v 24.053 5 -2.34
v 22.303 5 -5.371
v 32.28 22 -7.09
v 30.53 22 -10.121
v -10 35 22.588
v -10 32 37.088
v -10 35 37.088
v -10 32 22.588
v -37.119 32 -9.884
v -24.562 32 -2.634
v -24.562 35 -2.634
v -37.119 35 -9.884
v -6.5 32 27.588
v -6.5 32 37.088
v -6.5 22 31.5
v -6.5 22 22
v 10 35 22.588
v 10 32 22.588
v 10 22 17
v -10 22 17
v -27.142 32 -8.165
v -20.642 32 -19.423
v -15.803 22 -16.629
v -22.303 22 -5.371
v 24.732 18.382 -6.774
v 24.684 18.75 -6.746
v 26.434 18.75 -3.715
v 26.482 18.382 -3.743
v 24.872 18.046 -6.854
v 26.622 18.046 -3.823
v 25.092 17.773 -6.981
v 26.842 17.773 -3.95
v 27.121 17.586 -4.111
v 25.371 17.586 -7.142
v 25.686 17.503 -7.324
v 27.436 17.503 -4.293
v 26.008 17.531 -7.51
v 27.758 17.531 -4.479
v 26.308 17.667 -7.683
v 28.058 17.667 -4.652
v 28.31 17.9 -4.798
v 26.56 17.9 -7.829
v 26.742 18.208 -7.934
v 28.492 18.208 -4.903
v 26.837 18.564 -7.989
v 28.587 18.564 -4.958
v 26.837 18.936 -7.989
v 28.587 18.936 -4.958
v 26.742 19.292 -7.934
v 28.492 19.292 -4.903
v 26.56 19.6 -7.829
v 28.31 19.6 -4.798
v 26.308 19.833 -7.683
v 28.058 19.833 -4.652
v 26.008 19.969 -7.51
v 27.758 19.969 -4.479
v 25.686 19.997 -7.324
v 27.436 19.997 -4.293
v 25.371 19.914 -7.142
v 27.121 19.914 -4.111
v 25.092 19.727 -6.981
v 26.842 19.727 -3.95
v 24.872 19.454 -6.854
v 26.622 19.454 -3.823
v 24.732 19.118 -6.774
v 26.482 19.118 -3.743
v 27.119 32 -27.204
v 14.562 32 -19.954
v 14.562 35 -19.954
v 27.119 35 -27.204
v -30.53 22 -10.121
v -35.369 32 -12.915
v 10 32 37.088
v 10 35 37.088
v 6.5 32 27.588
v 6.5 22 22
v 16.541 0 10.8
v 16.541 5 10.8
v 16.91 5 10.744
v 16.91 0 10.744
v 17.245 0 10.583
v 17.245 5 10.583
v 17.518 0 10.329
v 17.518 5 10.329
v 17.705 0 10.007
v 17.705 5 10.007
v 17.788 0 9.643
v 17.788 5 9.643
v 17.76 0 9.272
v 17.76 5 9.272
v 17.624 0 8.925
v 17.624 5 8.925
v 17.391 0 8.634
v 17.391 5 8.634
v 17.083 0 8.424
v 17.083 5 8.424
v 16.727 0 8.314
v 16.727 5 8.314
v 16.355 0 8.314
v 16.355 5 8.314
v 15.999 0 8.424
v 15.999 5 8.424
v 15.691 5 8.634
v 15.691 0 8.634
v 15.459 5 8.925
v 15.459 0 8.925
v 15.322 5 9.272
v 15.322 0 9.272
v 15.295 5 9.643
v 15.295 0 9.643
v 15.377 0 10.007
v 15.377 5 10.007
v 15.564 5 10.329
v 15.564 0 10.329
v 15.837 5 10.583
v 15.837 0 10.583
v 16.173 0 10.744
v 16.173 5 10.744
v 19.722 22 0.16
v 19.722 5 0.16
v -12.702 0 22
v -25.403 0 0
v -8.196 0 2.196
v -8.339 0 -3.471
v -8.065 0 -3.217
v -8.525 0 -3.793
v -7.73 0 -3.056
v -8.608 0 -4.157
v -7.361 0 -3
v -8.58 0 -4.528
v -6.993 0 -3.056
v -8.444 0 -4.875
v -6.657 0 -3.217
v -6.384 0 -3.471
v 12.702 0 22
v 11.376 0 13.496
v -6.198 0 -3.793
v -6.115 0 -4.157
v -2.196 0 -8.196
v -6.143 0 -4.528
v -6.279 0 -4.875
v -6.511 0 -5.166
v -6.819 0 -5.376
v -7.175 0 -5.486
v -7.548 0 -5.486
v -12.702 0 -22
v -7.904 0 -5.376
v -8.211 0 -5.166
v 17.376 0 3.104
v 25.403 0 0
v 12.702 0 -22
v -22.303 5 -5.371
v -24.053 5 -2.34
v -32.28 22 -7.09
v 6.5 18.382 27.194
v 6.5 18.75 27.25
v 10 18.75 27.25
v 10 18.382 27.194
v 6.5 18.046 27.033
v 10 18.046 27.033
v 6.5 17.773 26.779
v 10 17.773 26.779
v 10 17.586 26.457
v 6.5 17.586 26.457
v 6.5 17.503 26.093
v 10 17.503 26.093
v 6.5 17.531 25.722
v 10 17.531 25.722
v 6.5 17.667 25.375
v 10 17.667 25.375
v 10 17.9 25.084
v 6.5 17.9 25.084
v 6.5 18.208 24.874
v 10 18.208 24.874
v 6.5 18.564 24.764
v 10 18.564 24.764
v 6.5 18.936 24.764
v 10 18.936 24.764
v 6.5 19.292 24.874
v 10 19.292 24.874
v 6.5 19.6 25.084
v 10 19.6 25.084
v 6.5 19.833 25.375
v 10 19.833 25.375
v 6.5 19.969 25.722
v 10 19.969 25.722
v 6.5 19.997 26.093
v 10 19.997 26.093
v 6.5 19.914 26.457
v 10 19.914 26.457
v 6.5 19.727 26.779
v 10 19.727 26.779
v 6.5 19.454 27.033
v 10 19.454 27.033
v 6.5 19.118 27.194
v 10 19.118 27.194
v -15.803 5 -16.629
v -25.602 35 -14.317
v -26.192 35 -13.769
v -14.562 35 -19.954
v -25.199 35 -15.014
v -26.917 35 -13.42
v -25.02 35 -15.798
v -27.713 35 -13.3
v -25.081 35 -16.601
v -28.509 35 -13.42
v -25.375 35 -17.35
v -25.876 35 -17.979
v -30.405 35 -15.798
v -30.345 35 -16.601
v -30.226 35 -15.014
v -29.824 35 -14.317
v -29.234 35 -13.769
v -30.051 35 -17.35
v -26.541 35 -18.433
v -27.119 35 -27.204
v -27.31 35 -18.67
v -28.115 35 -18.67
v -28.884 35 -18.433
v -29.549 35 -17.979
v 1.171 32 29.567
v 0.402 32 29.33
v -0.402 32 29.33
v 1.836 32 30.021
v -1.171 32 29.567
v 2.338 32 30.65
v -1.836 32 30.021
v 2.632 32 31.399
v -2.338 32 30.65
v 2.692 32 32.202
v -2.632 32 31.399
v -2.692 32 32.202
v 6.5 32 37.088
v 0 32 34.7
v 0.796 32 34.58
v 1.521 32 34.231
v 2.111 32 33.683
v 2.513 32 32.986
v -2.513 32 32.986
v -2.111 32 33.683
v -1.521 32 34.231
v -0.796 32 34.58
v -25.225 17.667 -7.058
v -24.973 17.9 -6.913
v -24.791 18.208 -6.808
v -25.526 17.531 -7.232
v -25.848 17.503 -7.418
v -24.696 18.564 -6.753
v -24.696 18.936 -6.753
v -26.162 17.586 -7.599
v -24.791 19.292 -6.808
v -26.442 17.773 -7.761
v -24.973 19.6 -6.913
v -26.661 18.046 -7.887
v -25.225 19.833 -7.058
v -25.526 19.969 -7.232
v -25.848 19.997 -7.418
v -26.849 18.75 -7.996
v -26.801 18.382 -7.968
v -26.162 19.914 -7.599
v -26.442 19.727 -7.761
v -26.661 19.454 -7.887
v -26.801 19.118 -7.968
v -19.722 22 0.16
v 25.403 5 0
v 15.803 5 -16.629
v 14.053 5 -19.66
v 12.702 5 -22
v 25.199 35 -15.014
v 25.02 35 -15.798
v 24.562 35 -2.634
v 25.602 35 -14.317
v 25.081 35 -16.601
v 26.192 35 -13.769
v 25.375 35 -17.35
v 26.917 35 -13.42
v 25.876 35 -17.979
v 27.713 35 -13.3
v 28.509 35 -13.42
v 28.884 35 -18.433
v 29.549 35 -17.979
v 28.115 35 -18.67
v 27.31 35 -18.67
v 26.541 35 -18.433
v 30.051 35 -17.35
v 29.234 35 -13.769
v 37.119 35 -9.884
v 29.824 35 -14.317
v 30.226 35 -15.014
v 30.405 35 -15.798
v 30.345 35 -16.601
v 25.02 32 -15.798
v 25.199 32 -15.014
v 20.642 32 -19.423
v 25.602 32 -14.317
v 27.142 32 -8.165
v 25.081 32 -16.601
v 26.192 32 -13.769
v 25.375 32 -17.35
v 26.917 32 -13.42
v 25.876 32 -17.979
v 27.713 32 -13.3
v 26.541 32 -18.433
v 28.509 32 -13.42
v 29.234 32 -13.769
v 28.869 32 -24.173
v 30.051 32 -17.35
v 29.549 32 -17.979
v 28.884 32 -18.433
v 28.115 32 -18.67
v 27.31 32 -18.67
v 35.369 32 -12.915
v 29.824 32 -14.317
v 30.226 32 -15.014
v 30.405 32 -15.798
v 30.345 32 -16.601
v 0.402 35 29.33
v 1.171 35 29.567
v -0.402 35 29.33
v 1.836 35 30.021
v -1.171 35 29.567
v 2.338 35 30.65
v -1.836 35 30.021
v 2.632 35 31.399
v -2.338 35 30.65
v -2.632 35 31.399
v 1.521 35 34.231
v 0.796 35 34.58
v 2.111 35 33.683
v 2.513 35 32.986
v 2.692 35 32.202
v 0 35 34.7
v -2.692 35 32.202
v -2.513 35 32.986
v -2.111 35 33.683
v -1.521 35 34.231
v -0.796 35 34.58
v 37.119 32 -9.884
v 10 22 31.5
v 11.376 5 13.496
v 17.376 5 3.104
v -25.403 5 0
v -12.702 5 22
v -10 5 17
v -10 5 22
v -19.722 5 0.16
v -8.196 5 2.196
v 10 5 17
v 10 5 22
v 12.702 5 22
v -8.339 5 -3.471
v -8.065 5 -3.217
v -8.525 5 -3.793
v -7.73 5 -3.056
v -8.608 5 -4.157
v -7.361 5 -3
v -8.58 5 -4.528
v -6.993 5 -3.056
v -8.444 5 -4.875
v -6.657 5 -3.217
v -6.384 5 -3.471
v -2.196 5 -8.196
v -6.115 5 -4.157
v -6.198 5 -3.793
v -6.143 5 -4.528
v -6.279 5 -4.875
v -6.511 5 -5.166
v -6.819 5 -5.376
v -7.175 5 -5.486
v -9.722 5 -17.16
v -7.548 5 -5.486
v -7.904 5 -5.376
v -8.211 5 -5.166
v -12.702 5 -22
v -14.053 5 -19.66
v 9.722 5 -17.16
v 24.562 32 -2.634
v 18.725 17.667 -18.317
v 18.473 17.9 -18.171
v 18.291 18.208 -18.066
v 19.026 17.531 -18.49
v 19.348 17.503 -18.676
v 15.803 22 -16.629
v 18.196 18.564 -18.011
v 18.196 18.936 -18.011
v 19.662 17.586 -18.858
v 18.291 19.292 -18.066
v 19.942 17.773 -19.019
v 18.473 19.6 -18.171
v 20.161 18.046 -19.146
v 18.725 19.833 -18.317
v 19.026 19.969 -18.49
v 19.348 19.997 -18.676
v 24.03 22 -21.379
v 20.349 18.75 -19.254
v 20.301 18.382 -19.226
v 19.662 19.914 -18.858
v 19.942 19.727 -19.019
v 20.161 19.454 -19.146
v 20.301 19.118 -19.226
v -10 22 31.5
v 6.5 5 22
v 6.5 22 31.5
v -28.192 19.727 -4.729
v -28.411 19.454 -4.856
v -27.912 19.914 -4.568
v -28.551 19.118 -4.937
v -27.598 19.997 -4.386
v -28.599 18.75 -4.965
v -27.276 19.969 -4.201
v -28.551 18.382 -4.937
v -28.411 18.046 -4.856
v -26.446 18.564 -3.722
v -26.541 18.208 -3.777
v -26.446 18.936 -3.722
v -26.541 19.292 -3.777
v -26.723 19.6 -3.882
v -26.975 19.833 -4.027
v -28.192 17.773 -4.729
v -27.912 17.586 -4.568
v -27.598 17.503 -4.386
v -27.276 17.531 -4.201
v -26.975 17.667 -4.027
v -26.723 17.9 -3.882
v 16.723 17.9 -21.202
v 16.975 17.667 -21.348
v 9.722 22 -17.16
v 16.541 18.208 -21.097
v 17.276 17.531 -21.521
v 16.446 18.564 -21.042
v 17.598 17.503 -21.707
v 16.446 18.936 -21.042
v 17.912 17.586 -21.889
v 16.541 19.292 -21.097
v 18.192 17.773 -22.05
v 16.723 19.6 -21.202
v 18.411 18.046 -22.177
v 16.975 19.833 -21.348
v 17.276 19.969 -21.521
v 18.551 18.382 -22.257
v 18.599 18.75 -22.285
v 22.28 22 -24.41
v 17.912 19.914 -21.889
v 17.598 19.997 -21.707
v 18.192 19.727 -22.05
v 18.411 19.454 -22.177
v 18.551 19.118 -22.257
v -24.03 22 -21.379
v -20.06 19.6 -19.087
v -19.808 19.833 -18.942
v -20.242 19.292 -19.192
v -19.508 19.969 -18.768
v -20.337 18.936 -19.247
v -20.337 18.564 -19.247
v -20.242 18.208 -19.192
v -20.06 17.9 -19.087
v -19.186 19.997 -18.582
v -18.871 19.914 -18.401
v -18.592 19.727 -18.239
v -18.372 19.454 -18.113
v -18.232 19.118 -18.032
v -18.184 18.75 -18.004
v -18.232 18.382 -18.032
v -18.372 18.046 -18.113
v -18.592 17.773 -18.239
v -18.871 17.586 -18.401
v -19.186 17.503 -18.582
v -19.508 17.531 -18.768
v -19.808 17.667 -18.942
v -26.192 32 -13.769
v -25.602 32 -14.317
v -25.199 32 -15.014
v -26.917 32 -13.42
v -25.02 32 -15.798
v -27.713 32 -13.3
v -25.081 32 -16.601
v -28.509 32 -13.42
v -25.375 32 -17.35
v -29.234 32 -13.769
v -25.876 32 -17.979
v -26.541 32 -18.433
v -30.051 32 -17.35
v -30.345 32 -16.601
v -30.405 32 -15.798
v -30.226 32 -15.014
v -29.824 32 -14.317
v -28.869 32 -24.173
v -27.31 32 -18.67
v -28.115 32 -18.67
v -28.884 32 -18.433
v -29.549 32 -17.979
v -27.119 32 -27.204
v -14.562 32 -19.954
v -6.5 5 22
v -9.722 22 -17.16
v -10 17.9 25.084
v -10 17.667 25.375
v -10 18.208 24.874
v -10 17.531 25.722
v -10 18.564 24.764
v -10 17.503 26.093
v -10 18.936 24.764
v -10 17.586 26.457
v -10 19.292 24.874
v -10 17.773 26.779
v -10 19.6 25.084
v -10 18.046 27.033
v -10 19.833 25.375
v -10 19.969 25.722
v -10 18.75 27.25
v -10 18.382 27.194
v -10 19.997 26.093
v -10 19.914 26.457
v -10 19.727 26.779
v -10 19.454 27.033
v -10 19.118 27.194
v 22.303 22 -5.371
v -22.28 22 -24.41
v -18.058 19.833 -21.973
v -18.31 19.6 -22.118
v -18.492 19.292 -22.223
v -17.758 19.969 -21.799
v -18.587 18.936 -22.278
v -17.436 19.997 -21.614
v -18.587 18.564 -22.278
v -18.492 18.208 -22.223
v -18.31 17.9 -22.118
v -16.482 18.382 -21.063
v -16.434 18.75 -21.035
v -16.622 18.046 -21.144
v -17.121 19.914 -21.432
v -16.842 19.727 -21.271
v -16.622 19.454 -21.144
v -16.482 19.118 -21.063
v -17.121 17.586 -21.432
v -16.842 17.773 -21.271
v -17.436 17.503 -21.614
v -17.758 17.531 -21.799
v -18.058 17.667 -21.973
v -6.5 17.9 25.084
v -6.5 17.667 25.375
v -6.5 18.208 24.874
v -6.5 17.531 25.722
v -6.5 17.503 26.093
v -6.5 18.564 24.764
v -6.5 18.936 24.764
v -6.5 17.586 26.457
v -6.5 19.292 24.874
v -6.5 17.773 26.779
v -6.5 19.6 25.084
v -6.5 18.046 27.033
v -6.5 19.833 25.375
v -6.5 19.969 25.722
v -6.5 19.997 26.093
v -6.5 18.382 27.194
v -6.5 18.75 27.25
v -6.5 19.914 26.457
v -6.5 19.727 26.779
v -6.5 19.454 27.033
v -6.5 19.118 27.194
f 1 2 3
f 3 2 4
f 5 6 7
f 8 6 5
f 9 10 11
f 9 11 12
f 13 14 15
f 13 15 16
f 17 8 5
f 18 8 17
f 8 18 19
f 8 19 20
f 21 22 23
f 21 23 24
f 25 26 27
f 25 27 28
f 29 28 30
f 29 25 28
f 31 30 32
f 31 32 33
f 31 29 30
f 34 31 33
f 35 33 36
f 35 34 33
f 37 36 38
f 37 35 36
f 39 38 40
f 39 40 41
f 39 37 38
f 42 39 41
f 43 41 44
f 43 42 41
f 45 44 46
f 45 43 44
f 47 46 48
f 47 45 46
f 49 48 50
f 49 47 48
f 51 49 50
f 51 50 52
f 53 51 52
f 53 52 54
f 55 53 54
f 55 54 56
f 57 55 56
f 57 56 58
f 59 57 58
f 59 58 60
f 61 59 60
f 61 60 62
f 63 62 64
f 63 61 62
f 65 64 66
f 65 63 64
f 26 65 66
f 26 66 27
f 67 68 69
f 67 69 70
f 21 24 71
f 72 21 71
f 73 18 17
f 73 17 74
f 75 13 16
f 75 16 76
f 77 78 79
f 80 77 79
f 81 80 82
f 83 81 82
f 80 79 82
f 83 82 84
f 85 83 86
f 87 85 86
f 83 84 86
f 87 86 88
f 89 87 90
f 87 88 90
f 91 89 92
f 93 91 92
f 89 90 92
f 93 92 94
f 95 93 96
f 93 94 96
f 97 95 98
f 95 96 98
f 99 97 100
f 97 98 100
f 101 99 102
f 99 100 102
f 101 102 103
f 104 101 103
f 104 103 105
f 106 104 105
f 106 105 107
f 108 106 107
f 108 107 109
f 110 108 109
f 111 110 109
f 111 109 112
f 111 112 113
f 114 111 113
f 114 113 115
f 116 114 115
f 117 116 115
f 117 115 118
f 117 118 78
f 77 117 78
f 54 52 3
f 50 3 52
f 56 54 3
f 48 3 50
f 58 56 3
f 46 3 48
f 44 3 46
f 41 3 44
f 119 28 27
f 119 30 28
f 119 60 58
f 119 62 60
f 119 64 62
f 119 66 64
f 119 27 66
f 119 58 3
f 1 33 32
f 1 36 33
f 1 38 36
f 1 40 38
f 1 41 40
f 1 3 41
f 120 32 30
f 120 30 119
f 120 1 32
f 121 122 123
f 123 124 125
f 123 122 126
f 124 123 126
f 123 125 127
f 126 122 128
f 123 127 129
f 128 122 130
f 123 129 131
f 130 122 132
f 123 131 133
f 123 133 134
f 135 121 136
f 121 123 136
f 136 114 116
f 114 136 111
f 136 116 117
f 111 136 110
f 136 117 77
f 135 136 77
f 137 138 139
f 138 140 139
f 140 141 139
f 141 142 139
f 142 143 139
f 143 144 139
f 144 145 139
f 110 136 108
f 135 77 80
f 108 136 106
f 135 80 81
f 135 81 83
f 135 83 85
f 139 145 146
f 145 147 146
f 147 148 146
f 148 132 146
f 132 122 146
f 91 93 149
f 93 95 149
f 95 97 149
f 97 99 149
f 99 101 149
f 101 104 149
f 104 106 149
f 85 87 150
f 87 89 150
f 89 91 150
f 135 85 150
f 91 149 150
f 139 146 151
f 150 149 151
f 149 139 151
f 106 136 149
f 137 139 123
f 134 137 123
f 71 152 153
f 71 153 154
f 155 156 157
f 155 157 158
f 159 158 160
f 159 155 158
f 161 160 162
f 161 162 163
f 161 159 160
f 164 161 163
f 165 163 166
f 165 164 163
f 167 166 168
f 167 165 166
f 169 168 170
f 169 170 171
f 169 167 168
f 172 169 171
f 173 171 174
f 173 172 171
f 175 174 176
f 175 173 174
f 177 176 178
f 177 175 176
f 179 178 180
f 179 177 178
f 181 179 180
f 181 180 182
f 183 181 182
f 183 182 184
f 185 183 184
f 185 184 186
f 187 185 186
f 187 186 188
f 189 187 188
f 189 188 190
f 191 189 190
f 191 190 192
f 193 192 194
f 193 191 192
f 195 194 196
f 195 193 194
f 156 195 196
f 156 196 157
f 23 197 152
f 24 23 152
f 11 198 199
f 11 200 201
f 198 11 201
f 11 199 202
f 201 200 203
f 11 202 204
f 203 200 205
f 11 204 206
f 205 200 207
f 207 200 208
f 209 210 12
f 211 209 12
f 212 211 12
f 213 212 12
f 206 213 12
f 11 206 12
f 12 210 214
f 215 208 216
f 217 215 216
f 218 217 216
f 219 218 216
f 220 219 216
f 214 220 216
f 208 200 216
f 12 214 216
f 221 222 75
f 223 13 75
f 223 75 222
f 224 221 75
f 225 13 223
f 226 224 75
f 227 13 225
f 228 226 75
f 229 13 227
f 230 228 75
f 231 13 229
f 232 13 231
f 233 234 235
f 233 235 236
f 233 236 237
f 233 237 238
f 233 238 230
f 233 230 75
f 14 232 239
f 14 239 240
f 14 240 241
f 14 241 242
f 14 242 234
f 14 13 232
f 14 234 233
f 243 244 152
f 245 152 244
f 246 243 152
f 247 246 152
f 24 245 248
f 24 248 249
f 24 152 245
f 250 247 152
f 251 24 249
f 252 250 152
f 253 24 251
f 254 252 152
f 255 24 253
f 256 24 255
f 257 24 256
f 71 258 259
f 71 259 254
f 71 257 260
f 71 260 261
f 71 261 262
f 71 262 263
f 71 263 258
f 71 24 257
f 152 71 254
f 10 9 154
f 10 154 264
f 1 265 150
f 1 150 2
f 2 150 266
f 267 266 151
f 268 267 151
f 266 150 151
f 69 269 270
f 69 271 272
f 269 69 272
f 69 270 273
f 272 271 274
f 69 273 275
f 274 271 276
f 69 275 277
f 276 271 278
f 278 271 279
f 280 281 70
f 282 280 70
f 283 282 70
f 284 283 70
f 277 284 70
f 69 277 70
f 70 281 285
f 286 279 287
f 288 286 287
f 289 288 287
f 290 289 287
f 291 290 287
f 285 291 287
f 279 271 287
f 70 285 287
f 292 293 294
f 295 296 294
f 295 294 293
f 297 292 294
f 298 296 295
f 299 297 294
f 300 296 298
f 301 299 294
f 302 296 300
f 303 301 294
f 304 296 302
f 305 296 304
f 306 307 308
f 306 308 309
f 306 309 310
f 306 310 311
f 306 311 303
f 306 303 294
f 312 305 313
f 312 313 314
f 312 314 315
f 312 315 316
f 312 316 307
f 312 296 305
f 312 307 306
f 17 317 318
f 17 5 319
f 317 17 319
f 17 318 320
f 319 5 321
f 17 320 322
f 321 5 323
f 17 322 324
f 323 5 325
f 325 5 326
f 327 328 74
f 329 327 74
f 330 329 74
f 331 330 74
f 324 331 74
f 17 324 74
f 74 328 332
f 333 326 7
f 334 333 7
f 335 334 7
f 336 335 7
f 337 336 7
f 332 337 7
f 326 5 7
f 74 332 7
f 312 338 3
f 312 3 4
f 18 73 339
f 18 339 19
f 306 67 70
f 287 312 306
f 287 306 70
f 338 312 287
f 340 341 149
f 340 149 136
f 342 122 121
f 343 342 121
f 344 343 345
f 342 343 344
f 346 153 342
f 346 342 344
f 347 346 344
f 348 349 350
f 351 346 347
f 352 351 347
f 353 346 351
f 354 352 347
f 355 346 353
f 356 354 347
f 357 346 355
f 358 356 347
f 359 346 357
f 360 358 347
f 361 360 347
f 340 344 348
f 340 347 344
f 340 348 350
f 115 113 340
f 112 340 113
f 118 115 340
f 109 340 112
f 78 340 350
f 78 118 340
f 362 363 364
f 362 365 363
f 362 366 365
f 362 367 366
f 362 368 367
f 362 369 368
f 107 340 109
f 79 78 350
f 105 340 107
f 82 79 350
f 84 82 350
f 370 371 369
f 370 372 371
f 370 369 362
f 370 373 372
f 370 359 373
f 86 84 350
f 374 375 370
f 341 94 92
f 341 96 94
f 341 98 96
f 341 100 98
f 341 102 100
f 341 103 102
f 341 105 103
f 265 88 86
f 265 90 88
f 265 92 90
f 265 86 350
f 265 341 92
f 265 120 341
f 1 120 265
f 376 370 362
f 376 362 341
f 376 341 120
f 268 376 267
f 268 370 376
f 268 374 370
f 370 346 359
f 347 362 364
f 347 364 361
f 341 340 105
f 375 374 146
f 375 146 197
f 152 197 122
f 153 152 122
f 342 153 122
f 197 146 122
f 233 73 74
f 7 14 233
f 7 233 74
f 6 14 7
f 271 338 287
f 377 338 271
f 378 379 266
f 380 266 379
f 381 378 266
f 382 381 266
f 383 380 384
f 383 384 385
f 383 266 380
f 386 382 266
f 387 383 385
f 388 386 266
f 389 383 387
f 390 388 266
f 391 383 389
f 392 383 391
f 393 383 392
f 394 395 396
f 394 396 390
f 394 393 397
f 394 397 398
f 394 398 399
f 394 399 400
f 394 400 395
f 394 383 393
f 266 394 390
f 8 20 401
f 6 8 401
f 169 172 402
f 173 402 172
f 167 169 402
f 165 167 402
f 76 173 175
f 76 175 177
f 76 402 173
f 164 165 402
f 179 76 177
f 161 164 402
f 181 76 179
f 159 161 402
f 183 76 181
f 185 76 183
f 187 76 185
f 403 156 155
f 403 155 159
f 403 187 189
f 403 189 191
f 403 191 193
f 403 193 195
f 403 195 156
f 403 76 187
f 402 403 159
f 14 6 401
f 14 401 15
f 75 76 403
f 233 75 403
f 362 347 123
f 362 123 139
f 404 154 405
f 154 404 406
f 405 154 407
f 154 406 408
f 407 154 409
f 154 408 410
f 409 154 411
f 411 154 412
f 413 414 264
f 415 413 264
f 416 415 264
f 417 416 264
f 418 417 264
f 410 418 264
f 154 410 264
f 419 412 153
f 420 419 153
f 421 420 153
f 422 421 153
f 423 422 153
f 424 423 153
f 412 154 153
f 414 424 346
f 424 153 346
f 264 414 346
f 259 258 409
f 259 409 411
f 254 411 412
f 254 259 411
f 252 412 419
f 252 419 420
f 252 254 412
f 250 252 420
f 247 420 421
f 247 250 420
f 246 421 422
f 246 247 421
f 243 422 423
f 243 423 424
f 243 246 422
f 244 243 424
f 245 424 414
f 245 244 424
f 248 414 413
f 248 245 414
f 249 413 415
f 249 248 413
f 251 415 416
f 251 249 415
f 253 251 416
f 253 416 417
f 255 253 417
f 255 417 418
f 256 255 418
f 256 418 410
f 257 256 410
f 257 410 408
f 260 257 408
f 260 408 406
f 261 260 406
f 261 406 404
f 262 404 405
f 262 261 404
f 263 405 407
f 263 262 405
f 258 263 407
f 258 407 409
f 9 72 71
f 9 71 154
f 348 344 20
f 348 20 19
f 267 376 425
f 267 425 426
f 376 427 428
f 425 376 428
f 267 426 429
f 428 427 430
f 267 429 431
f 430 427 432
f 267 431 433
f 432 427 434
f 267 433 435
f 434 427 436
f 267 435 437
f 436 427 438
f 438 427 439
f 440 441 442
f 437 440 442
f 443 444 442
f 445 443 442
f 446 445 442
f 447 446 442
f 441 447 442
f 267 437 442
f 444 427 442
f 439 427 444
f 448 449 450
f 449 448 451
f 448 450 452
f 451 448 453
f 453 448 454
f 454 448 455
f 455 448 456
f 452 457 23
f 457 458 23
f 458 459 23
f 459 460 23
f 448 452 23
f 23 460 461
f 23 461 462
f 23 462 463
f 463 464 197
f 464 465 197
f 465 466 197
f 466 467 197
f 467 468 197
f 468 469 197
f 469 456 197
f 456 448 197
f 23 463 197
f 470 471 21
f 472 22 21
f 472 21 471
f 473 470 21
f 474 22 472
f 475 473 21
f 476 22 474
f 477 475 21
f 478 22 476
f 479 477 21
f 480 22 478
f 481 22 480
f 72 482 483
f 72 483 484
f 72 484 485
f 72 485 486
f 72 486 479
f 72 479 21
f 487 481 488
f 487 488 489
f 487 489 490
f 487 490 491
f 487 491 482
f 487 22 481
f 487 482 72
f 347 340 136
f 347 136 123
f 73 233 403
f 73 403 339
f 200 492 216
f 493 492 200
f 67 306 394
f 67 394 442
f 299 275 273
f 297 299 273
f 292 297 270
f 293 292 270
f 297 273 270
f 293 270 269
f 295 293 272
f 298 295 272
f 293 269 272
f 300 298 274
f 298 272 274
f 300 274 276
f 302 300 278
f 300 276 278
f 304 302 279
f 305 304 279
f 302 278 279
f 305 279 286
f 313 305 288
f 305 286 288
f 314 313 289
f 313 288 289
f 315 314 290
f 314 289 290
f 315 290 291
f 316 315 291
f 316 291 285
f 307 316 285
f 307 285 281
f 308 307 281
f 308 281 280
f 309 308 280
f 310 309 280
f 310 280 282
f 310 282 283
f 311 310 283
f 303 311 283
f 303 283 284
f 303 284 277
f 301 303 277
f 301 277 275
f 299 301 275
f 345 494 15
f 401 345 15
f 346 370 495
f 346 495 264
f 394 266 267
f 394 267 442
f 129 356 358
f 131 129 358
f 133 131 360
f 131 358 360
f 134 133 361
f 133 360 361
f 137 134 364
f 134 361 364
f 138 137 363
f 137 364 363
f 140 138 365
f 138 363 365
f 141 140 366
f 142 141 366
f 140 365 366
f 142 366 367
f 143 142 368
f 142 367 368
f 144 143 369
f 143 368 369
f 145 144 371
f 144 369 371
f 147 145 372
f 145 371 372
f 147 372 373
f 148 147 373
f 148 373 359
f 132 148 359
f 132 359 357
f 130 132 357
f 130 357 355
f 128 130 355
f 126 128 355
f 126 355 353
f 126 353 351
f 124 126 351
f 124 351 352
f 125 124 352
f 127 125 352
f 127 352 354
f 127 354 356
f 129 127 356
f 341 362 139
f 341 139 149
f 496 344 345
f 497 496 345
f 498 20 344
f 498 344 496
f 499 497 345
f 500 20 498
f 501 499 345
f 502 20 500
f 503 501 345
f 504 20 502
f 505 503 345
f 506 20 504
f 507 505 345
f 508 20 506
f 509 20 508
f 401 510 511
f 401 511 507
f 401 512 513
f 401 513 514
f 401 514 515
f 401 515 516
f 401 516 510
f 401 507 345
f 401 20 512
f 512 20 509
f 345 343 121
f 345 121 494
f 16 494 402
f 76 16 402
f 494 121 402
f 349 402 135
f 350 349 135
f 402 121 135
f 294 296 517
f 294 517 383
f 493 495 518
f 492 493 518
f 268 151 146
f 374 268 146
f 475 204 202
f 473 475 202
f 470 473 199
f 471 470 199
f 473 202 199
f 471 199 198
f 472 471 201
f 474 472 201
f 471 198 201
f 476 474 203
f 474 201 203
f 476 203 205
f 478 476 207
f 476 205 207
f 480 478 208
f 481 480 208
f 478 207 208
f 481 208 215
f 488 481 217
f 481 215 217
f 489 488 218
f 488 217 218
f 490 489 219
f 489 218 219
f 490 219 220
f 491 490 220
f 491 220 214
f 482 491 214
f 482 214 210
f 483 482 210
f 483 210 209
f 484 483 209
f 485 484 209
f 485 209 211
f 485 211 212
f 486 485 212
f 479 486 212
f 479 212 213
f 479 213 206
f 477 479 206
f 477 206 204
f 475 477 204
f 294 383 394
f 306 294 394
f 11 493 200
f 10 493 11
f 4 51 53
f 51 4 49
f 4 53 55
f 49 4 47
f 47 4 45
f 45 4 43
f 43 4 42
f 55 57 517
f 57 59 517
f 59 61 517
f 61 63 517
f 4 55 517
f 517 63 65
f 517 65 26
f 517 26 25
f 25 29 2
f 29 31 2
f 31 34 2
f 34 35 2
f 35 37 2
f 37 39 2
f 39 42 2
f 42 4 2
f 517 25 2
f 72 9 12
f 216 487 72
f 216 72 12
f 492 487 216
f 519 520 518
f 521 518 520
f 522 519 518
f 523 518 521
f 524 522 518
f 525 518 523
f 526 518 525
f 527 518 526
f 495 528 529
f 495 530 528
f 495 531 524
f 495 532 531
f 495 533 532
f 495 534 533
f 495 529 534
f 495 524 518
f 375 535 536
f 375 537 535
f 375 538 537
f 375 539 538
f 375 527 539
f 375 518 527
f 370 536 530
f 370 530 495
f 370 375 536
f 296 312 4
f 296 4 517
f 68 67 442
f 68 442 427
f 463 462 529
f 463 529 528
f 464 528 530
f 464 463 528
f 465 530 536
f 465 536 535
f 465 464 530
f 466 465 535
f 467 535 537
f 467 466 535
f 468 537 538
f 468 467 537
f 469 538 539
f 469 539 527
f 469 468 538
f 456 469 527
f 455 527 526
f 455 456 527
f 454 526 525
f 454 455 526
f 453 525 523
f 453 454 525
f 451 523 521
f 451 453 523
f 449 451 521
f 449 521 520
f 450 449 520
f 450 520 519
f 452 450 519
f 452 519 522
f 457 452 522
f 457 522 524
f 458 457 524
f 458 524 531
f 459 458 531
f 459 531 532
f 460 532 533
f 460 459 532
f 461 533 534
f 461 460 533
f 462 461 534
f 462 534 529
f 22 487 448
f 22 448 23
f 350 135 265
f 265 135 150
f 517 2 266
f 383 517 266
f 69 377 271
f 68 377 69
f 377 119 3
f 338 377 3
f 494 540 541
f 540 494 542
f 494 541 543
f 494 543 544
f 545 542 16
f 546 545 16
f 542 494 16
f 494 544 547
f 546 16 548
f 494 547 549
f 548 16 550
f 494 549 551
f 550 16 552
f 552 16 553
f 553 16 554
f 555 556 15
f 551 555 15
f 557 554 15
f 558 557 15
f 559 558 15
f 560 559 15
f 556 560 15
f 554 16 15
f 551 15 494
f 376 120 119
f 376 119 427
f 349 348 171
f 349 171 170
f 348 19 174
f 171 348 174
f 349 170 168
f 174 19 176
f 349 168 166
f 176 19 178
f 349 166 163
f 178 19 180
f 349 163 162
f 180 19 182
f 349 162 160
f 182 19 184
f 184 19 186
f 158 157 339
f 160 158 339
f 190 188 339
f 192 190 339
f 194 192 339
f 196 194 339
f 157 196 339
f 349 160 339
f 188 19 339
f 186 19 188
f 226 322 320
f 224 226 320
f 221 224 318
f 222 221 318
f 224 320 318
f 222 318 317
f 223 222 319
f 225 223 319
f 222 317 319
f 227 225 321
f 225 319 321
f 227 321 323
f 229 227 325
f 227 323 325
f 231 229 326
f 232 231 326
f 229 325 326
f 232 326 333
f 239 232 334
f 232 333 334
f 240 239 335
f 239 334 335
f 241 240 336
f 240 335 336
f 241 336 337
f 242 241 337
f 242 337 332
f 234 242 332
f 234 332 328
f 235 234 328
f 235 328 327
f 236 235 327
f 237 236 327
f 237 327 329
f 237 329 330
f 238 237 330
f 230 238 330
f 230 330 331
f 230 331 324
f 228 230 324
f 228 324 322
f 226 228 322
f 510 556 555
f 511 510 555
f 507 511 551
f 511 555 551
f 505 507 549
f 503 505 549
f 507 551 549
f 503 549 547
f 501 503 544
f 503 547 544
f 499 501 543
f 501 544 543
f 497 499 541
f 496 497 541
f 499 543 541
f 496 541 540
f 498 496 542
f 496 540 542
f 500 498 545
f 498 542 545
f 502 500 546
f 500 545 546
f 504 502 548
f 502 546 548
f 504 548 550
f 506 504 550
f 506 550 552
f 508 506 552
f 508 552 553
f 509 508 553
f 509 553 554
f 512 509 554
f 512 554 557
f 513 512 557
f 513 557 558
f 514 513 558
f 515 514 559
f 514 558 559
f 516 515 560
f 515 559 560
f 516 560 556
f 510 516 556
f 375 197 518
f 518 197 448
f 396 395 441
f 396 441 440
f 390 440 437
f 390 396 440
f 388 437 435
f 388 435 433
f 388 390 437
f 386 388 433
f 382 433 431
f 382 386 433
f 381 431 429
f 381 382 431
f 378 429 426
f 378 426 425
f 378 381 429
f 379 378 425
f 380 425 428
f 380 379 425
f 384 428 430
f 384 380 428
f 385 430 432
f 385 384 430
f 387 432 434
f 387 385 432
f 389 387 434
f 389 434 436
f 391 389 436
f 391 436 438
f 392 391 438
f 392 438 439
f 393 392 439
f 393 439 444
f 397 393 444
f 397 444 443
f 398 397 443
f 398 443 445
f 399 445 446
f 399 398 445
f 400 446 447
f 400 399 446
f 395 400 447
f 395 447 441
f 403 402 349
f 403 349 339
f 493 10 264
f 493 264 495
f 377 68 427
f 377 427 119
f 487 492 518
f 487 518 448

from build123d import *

# Parameters (mm, degrees)
BOSS_EXTRUDE1_DEPTH         = 5
SKETCH4_W                   = 20
SKETCH4_H                   = 5
BOSS_EXTRUDE3_DEPTH         = 17
BOSS_EXTRUDE2_START         = 6.5
SKETCH2_R                   = 1.25
BOSS_EXTRUDE2_DEPTH         = 3.5
CIRPATTERN1_COUNT           = 3
CIRPATTERN1_COPY_1_SKETCH_W = 20
CIRPATTERN1_COPY_1_SKETCH_H = 5
CIRPATTERN1_COPY_1_DEPTH    = 17
CIRPATTERN1_COPY_2_SKETCH_W = 20
CIRPATTERN1_COPY_2_SKETCH_H = 5
CIRPATTERN1_COPY_2_DEPTH    = 17
CIRPATTERN1_START           = 6.5
CIRPATTERN1_COPY_3_SKETCH_R = 1.25
CIRPATTERN1_COPY_3_DEPTH    = 3.5
CIRPATTERN1_COPY_4_SKETCH_R = 1.25
CIRPATTERN1_COPY_4_DEPTH    = 3.5
CUT_EXTRUDE1_REACH          = 50.2
CUT_EXTRUDE2_REACH          = 50.2
SKETCH6_R                   = 1.25
BOSS_EXTRUDE4_DEPTH         = 3
CUT_EXTRUDE3_REACH          = 61.959
SKETCH13_R                  = 2.7
CIRPATTERN2_COUNT           = 3


with BuildPart() as part:
    # Sketch1 → Boss-Extrude1 (new body)
    with BuildSketch(Plane(origin=(0, 0, 0), x_dir=(1, 0, 0), z_dir=(0, 1, 0))):
        Polygon((25.403411844, 0), (12.701705922, 22), (-12.701705922, 22), (-25.403411844, 0), (-12.701705922, -22), (12.701705922, -22), align=None)
    extrude(amount=BOSS_EXTRUDE1_DEPTH)

    # Sketch4 → Boss-Extrude3 (add)
    with BuildSketch(Plane(origin=(0, 5, 0), x_dir=(1, 0, 0), z_dir=(0, 1, 0))):
        with Locations((0, -19.5)):
            Rectangle(SKETCH4_W, SKETCH4_H)
    boss_extrude3 = extrude(amount=BOSS_EXTRUDE3_DEPTH)

    # Sketch2 → Boss-Extrude2 (add)
    with BuildSketch(Plane(origin=(0, 0, 0), x_dir=(0, 0, -1), z_dir=(1, 0, 0)).offset(BOSS_EXTRUDE2_START)):
        Polygon((-22, 22), (-22, 5), (-31.5, 22), align=None)
        with Locations(Location((-26, 18.75, 0), (0, 0, 180))):
            Circle(SKETCH2_R, mode=Mode.SUBTRACT)
    boss_extrude2 = extrude(amount=BOSS_EXTRUDE2_DEPTH)

    # Mirror1: Boss-Extrude3, Boss-Extrude2 across plane
    add(boss_extrude3.mirror(Plane(origin=(0, 0, 0), x_dir=(0, 0, 1), z_dir=(1, 0, 0))))
    add(boss_extrude2.mirror(Plane(origin=(0, 0, 0), x_dir=(0, 0, 1), z_dir=(1, 0, 0))))

    # CirPattern1: Boss-Extrude3, Boss-Extrude2 ×3 about axis
    cirpattern1_axis = Axis((0, 0, 0), (0, 1, 0))
    add([boss_extrude3.rotate(cirpattern1_axis, i * 360 / CIRPATTERN1_COUNT) for i in range(1, CIRPATTERN1_COUNT)])
    add([boss_extrude2.rotate(cirpattern1_axis, i * 360 / CIRPATTERN1_COUNT) for i in range(1, CIRPATTERN1_COUNT)])

    # CirPattern1 copy 1 sketch → CirPattern1 copy 1 (add)
    with BuildSketch(Plane(origin=(0, 5, 0), x_dir=(0.4999999999999998, 0, 0.8660254037844387), z_dir=(0, 1, 0))):
        with Locations((0, 19.5)):
            Rectangle(CIRPATTERN1_COPY_1_SKETCH_W, CIRPATTERN1_COPY_1_SKETCH_H)
    extrude(amount=CIRPATTERN1_COPY_1_DEPTH)

    # CirPattern1 copy 2 sketch → CirPattern1 copy 2 (add)
    with BuildSketch(Plane(origin=(0, 5, 0), x_dir=(0.5000000000000004, 0, -0.8660254037844384), z_dir=(0, 1, 0))):
        with Locations((0, 19.5)):
            Rectangle(CIRPATTERN1_COPY_2_SKETCH_W, CIRPATTERN1_COPY_2_SKETCH_H)
    extrude(amount=CIRPATTERN1_COPY_2_DEPTH)

    # CirPattern1 copy 3 sketch → CirPattern1 copy 3 (add)
    with BuildSketch(Plane(origin=(0, 0, 0), x_dir=(-0.8660254037844387, 0, 0.4999999999999998), z_dir=(0.4999999999999998, 0, 0.8660254037844387)).offset(CIRPATTERN1_START)):
        Polygon((-22, -22), (-22, -5), (-31.5, -22), align=None)
        with Locations((-26, -18.75)):
            Circle(CIRPATTERN1_COPY_3_SKETCH_R, mode=Mode.SUBTRACT)
    extrude(amount=CIRPATTERN1_COPY_3_DEPTH)

    # CirPattern1 copy 4 sketch → CirPattern1 copy 4 (add)
    with BuildSketch(Plane(origin=(0, 0, 0), x_dir=(0.8660254037844384, 0, 0.5000000000000004), z_dir=(0.5000000000000004, 0, -0.8660254037844384)).offset(CIRPATTERN1_START)):
        Polygon((-22, -22), (-22, -5), (-31.5, -22), align=None)
        with Locations((-26, -18.75)):
            Circle(CIRPATTERN1_COPY_4_SKETCH_R, mode=Mode.SUBTRACT)
    extrude(amount=CIRPATTERN1_COPY_4_DEPTH)

    # Sketch3 → Cut-Extrude1 (cut, up to next)
    with BuildSketch(Plane(origin=(0, 5, 0), x_dir=(1, 0, 0), z_dir=(0, 1, 0)), mode=Mode.PRIVATE) as cut_extrude1_sk1:
        Polygon((-2.196152423, 8.196152423), (17.376021703, -3.103847577), (11.376021703, -13.496152423), (-8.196152423, -2.196152423), align=None)
    cut_extrude1_tool1 = extrude(cut_extrude1_sk1.sketch, amount=-CUT_EXTRUDE1_REACH, mode=Mode.PRIVATE) & part.part
    add(cut_extrude1_tool1.solids().sort_by_distance((4.589935, 5, 2.65))[0], mode=Mode.SUBTRACT)

    # Sketch6 → Cut-Extrude2 (cut, up to next)
    with BuildSketch(Plane(origin=(0, 5, 0), x_dir=(1, 0, 0), z_dir=(0, 1, 0)), mode=Mode.PRIVATE) as cut_extrude2_sk1:
        with Locations(Location((-7.361215932, 4.25, 0), (0, 0, 270))):
            Circle(SKETCH6_R)
    cut_extrude2_tool1 = extrude(cut_extrude2_sk1.sketch, amount=-CUT_EXTRUDE2_REACH, mode=Mode.PRIVATE) & part.part
    # Sketch6 → Cut-Extrude2 (cut, up to next)
    with BuildSketch(Plane(origin=(0, 5, 0), x_dir=(1, 0, 0), z_dir=(0, 1, 0)), mode=Mode.PRIVATE) as cut_extrude2_sk2:
        with Locations(Location((16.541085212, -9.55, 0), (0, 0, 270))):
            Circle(SKETCH6_R)
    cut_extrude2_tool2 = extrude(cut_extrude2_sk2.sketch, amount=-CUT_EXTRUDE2_REACH, mode=Mode.PRIVATE) & part.part
    add(cut_extrude2_tool1.solids().sort_by_distance((-7.361216, 5, -4.25))[0], mode=Mode.SUBTRACT)
    add(cut_extrude2_tool2.solids().sort_by_distance((16.541085, 5, 9.55))[0], mode=Mode.SUBTRACT)

    # Sweep1: sweep along a path in Sketch11
    with BuildLine(Plane(origin=(-5, 0, 8.660254038), x_dir=(0.8660254037844364, 0, 0.5000000000000041), z_dir=(-0.500000000000004, 0, 0.8660254037844363))) as sweep1_path:
        Line((-31.5, 22), (-37.088235294, 32))
    # Sketch10 → Sweep1 (sweep)
    with BuildSketch(Plane(origin=(0, 22, 0), x_dir=(1, 0, 0), z_dir=(0, 1, 0))):
        Polygon((-22.279800219, 24.410254038), (-9.722431864, 17.160254038), (-19.722431864, -0.160254038), (-32.279800219, 7.089745962), (-30.529800219, 10.120834875), (-22.302558883, 5.370834875), (-15.802558883, 16.629165125), (-24.029800219, 21.379165125), align=None)
    sweep1 = sweep(path=sweep1_path.line)

    # Sketch12 → Boss-Extrude4 (add)
    with BuildSketch(Plane(origin=(0, 32, 0), x_dir=(1, 0, 0), z_dir=(0, 1, 0))):
        Polygon((-27.119353946, 27.204371685), (-14.561985591, 19.954371685), (-24.561985591, 2.633863609), (-37.119353946, 9.883863609), align=None)
    boss_extrude4 = extrude(amount=BOSS_EXTRUDE4_DEPTH)

    # Sketch13 → Cut-Extrude3 (cut, up to next)
    with BuildSketch(Plane(origin=(0, 35, 0), x_dir=(1, 0, 0), z_dir=(0, 1, 0)), mode=Mode.PRIVATE) as cut_extrude3_sk1:
        with Locations(Location((-27.712812921, 16, 0), (0, 0, 270))):
            Circle(SKETCH13_R)
    cut_extrude3_tool1 = extrude(cut_extrude3_sk1.sketch, amount=-CUT_EXTRUDE3_REACH, mode=Mode.PRIVATE) & part.part
    cut_extrude3 = cut_extrude3_tool1.solids().sort_by_distance((-27.712813, 35, -16))[0]
    add(cut_extrude3, mode=Mode.SUBTRACT)

    # CirPattern2: Sweep1, Boss-Extrude4, Cut-Extrude3 ×3 about axis
    cirpattern2_axis = Axis((0, 0, 0), (0, 1, 0))
    add([sweep1.rotate(cirpattern2_axis, i * 360 / CIRPATTERN2_COUNT) for i in range(1, CIRPATTERN2_COUNT)])
    add([boss_extrude4.rotate(cirpattern2_axis, i * 360 / CIRPATTERN2_COUNT) for i in range(1, CIRPATTERN2_COUNT)])
    add([cut_extrude3.rotate(cirpattern2_axis, i * 360 / CIRPATTERN2_COUNT) for i in range(1, CIRPATTERN2_COUNT)], mode=Mode.SUBTRACT)


solid = part.part
